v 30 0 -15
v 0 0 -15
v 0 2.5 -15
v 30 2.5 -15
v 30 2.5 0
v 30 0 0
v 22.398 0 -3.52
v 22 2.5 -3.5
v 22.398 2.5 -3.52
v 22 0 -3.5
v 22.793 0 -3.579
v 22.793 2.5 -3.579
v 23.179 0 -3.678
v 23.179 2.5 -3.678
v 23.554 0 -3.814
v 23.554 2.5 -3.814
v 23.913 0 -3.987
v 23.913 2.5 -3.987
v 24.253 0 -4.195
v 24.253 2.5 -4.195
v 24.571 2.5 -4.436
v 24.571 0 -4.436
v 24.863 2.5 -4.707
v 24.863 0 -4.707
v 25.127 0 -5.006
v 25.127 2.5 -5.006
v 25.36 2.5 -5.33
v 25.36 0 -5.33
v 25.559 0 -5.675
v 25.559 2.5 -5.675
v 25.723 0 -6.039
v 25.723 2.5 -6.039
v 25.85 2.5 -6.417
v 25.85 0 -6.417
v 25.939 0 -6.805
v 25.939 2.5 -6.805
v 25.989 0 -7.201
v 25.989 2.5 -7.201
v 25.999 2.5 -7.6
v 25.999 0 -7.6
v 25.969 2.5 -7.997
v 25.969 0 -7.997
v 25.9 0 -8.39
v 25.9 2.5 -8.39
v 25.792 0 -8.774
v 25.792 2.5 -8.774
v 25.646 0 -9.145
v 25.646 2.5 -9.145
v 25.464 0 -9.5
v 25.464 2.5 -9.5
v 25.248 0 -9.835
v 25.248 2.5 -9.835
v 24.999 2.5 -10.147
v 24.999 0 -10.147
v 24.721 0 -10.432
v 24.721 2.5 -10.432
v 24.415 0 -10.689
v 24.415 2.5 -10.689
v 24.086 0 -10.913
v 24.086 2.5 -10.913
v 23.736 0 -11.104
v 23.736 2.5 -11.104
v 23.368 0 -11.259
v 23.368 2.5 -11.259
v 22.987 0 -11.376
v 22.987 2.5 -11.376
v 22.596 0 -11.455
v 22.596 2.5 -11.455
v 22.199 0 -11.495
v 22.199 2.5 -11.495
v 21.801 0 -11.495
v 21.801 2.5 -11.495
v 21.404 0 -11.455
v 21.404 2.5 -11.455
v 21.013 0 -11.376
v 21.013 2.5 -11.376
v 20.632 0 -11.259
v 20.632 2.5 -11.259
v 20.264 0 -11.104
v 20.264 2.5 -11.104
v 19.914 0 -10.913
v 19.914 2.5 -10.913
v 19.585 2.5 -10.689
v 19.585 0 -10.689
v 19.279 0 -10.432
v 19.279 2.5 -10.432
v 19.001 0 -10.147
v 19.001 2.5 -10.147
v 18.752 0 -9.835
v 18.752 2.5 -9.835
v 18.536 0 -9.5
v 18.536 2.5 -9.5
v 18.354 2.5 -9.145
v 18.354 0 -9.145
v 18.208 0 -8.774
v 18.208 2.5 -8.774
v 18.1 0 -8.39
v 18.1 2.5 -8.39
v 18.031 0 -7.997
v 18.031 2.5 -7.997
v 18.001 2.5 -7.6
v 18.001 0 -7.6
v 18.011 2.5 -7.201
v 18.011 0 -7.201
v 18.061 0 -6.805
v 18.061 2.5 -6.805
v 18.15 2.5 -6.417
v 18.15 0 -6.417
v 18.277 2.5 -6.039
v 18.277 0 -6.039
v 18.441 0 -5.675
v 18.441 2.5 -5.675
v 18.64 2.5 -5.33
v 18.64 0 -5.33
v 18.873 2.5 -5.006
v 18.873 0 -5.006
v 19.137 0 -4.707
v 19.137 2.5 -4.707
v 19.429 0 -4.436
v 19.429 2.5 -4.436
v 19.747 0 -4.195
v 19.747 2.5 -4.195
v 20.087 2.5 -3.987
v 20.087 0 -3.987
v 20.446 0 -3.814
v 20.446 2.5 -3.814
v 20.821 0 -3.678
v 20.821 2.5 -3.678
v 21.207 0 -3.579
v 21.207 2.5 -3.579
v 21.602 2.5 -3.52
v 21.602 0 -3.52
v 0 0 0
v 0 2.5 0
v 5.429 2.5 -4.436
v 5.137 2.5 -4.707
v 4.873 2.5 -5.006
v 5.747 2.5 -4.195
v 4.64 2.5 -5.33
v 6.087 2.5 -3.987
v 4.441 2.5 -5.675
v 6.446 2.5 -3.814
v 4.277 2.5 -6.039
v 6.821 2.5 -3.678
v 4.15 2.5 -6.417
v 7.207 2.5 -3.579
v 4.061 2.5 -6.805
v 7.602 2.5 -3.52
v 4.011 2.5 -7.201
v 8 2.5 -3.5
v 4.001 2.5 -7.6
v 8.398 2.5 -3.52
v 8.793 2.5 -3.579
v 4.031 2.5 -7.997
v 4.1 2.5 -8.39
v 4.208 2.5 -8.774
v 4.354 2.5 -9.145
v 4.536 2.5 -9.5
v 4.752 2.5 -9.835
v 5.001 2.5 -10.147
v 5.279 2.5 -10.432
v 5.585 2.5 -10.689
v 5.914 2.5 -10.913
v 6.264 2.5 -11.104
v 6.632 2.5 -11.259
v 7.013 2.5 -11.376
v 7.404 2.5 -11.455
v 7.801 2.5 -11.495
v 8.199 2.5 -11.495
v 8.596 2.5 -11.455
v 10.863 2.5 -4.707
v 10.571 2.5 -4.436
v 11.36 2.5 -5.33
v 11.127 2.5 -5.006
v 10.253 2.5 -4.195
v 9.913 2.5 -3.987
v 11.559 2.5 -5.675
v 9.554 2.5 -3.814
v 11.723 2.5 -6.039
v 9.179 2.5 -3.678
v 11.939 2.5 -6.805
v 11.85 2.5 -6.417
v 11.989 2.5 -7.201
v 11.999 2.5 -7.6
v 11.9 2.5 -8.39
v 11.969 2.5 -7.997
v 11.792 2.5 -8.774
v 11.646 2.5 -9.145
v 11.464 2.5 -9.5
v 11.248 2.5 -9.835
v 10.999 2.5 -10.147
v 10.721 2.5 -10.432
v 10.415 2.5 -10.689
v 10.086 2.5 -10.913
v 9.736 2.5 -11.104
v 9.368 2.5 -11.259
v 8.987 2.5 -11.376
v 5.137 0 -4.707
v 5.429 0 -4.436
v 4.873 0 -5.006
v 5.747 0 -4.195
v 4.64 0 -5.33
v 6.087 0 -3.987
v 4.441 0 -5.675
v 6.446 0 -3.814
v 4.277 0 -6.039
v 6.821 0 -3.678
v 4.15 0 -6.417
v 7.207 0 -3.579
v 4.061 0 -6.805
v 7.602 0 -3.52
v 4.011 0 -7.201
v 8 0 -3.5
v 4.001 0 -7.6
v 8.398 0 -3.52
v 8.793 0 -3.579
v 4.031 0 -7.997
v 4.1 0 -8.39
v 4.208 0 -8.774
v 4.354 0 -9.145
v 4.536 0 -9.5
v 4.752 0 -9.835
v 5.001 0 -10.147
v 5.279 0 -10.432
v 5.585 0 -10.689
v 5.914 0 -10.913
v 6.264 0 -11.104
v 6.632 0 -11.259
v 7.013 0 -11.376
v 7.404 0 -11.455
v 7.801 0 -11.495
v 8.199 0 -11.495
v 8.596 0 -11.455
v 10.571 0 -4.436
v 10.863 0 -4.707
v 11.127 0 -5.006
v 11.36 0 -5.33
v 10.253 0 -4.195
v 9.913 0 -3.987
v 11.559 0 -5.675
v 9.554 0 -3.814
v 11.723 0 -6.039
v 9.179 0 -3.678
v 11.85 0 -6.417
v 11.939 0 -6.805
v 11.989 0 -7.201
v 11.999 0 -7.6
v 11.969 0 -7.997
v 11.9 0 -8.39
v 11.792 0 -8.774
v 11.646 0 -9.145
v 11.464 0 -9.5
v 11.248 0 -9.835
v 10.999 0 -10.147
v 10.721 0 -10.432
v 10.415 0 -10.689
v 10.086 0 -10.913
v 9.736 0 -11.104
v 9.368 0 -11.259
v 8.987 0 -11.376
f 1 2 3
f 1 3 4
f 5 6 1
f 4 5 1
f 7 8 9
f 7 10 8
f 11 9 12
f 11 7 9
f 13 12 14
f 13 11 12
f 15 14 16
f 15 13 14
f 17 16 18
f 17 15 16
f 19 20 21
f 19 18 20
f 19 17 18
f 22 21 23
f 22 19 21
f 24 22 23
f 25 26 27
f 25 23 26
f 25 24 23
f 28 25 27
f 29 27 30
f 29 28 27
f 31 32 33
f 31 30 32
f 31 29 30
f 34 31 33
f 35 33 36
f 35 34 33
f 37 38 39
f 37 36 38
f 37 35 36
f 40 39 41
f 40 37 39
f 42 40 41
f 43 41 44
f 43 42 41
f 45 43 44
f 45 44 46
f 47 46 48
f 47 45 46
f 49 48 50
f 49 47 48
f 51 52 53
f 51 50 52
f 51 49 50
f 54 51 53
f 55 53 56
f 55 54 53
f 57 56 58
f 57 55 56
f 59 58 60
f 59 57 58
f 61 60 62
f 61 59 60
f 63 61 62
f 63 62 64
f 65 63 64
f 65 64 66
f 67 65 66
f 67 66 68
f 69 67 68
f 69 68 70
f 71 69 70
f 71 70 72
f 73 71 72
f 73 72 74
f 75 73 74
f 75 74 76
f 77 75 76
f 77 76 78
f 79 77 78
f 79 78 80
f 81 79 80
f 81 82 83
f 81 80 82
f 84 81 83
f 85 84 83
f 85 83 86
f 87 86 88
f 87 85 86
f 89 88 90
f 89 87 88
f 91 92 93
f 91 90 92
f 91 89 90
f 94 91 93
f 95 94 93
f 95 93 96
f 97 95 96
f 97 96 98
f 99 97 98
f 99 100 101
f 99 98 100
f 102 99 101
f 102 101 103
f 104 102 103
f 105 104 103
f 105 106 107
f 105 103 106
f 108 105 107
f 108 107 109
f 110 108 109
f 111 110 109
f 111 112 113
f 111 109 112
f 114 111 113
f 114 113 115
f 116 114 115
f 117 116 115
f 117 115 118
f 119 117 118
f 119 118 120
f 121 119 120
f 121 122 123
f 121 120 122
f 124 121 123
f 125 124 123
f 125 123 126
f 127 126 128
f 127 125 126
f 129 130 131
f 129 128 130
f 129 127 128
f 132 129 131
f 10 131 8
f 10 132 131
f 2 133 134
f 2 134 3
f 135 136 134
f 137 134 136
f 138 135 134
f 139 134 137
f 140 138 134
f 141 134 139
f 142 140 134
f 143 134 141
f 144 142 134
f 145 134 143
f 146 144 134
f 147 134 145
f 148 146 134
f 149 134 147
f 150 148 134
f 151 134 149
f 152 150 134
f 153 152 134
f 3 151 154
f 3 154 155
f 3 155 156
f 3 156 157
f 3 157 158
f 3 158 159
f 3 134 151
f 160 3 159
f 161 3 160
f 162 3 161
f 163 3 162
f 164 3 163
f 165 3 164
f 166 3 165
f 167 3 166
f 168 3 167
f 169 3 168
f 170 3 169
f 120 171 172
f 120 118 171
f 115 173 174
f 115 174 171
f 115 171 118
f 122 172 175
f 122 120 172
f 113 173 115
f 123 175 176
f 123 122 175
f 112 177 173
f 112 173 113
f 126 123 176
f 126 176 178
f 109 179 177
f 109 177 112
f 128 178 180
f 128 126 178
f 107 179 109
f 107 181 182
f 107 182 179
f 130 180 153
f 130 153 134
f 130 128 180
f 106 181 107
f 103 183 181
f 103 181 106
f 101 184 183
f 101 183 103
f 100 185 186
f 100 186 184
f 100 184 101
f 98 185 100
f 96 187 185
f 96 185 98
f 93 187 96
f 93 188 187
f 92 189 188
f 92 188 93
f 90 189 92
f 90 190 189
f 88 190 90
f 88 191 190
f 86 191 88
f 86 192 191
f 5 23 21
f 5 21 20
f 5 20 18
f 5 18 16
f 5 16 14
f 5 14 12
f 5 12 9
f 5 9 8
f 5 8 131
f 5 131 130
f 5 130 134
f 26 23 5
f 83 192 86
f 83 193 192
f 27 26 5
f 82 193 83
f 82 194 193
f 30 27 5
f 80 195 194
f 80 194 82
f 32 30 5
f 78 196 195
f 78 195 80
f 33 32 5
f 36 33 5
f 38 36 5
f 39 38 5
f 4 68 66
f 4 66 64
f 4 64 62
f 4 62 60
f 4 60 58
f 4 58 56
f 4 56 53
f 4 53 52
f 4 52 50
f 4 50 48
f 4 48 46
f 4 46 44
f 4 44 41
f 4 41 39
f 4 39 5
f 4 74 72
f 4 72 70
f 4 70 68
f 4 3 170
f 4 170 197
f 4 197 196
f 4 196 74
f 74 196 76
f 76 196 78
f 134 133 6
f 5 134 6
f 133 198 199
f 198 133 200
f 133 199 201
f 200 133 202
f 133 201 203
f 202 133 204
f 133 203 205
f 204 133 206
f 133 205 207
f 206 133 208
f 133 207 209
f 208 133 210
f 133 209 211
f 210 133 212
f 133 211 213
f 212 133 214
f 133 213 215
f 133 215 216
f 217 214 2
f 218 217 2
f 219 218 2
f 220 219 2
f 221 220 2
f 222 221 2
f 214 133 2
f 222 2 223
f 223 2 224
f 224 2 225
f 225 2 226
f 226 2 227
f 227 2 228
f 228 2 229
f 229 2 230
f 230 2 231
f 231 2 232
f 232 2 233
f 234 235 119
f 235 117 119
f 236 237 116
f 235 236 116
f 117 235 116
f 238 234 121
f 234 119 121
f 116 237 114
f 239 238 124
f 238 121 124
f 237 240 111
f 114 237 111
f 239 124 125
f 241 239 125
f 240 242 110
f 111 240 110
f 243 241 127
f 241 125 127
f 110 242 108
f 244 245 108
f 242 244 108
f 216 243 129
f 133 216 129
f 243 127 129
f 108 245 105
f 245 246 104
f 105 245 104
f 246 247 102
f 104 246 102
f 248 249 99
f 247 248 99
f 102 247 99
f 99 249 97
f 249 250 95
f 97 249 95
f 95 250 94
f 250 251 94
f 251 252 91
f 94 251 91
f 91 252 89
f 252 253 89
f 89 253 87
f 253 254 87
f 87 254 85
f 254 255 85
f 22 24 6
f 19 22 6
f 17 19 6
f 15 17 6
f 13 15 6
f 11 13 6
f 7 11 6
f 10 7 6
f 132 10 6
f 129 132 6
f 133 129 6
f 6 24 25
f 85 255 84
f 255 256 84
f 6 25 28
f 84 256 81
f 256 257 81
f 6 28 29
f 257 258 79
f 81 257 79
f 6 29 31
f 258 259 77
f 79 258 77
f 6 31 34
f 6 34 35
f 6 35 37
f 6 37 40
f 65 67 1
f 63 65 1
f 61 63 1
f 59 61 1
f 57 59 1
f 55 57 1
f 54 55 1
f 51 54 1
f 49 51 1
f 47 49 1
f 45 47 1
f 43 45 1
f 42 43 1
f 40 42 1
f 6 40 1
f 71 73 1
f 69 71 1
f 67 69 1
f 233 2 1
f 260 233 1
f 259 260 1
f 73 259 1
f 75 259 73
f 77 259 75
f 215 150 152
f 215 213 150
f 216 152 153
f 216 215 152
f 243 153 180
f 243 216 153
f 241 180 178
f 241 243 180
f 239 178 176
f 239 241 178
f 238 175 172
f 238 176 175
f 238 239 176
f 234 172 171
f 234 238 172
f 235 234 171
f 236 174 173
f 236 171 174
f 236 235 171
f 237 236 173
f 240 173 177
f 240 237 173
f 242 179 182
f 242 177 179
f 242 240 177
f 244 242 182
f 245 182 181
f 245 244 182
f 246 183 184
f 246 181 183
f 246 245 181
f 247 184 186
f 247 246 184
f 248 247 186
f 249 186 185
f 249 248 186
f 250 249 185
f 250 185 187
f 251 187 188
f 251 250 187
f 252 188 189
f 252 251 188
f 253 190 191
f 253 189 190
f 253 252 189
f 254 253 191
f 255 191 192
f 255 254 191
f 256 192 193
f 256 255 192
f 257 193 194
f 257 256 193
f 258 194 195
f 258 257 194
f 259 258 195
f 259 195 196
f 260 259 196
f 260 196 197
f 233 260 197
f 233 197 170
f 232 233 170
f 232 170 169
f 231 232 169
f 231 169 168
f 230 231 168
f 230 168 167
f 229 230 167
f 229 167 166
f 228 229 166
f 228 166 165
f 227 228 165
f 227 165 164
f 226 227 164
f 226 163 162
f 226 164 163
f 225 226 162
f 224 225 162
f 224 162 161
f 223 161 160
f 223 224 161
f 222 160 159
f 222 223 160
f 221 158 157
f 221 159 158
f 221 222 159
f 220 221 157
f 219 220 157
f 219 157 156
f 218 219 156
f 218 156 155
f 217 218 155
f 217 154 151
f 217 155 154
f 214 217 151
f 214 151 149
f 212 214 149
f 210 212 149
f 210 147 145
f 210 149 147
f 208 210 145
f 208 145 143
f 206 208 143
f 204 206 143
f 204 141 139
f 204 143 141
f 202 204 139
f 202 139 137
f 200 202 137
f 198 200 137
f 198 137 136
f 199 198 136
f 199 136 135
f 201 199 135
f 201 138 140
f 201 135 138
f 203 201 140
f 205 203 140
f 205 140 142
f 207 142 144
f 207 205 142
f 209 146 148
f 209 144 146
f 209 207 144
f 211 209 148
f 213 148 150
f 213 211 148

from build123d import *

# Parameters (mm, degrees)
SKETCH2_W               = 30
SKETCH2_H               = 15
BOSS_EXTRUDE1_DEPTH     = 2.5
CUT_EXTRUDE1_DEPTH      = 34.634060118
CUT_EXTRUDE1_DEPTH_BACK = 34.634060118
SKETCH4_R               = 4


with BuildPart() as part:
    # Sketch2 → Boss-Extrude1 (new body)
    with BuildSketch(Plane(origin=(0, 0, 0), x_dir=(1, 0, 0), z_dir=(0, 1, 0))):
        with Locations((15, 7.5)):
            Rectangle(SKETCH2_W, SKETCH2_H)
    extrude(amount=BOSS_EXTRUDE1_DEPTH)

    # Sketch4 → Cut-Extrude1 (cut, two sides: drawn at the far end of the back side and taken through both)
    with BuildSketch(Plane(origin=(0, 2.5, 0), x_dir=(1, 0, 0), z_dir=(0, 1, 0)).offset(-CUT_EXTRUDE1_DEPTH_BACK)):
        with Locations(Location((22, 7.5, 0), (0, 0, 270))):
            Circle(SKETCH4_R)
        with Locations(Location((8, 7.5, 0), (0, 0, 270))):
            Circle(SKETCH4_R)
    extrude(amount=CUT_EXTRUDE1_DEPTH + CUT_EXTRUDE1_DEPTH_BACK, mode=Mode.SUBTRACT)


solid = part.part
